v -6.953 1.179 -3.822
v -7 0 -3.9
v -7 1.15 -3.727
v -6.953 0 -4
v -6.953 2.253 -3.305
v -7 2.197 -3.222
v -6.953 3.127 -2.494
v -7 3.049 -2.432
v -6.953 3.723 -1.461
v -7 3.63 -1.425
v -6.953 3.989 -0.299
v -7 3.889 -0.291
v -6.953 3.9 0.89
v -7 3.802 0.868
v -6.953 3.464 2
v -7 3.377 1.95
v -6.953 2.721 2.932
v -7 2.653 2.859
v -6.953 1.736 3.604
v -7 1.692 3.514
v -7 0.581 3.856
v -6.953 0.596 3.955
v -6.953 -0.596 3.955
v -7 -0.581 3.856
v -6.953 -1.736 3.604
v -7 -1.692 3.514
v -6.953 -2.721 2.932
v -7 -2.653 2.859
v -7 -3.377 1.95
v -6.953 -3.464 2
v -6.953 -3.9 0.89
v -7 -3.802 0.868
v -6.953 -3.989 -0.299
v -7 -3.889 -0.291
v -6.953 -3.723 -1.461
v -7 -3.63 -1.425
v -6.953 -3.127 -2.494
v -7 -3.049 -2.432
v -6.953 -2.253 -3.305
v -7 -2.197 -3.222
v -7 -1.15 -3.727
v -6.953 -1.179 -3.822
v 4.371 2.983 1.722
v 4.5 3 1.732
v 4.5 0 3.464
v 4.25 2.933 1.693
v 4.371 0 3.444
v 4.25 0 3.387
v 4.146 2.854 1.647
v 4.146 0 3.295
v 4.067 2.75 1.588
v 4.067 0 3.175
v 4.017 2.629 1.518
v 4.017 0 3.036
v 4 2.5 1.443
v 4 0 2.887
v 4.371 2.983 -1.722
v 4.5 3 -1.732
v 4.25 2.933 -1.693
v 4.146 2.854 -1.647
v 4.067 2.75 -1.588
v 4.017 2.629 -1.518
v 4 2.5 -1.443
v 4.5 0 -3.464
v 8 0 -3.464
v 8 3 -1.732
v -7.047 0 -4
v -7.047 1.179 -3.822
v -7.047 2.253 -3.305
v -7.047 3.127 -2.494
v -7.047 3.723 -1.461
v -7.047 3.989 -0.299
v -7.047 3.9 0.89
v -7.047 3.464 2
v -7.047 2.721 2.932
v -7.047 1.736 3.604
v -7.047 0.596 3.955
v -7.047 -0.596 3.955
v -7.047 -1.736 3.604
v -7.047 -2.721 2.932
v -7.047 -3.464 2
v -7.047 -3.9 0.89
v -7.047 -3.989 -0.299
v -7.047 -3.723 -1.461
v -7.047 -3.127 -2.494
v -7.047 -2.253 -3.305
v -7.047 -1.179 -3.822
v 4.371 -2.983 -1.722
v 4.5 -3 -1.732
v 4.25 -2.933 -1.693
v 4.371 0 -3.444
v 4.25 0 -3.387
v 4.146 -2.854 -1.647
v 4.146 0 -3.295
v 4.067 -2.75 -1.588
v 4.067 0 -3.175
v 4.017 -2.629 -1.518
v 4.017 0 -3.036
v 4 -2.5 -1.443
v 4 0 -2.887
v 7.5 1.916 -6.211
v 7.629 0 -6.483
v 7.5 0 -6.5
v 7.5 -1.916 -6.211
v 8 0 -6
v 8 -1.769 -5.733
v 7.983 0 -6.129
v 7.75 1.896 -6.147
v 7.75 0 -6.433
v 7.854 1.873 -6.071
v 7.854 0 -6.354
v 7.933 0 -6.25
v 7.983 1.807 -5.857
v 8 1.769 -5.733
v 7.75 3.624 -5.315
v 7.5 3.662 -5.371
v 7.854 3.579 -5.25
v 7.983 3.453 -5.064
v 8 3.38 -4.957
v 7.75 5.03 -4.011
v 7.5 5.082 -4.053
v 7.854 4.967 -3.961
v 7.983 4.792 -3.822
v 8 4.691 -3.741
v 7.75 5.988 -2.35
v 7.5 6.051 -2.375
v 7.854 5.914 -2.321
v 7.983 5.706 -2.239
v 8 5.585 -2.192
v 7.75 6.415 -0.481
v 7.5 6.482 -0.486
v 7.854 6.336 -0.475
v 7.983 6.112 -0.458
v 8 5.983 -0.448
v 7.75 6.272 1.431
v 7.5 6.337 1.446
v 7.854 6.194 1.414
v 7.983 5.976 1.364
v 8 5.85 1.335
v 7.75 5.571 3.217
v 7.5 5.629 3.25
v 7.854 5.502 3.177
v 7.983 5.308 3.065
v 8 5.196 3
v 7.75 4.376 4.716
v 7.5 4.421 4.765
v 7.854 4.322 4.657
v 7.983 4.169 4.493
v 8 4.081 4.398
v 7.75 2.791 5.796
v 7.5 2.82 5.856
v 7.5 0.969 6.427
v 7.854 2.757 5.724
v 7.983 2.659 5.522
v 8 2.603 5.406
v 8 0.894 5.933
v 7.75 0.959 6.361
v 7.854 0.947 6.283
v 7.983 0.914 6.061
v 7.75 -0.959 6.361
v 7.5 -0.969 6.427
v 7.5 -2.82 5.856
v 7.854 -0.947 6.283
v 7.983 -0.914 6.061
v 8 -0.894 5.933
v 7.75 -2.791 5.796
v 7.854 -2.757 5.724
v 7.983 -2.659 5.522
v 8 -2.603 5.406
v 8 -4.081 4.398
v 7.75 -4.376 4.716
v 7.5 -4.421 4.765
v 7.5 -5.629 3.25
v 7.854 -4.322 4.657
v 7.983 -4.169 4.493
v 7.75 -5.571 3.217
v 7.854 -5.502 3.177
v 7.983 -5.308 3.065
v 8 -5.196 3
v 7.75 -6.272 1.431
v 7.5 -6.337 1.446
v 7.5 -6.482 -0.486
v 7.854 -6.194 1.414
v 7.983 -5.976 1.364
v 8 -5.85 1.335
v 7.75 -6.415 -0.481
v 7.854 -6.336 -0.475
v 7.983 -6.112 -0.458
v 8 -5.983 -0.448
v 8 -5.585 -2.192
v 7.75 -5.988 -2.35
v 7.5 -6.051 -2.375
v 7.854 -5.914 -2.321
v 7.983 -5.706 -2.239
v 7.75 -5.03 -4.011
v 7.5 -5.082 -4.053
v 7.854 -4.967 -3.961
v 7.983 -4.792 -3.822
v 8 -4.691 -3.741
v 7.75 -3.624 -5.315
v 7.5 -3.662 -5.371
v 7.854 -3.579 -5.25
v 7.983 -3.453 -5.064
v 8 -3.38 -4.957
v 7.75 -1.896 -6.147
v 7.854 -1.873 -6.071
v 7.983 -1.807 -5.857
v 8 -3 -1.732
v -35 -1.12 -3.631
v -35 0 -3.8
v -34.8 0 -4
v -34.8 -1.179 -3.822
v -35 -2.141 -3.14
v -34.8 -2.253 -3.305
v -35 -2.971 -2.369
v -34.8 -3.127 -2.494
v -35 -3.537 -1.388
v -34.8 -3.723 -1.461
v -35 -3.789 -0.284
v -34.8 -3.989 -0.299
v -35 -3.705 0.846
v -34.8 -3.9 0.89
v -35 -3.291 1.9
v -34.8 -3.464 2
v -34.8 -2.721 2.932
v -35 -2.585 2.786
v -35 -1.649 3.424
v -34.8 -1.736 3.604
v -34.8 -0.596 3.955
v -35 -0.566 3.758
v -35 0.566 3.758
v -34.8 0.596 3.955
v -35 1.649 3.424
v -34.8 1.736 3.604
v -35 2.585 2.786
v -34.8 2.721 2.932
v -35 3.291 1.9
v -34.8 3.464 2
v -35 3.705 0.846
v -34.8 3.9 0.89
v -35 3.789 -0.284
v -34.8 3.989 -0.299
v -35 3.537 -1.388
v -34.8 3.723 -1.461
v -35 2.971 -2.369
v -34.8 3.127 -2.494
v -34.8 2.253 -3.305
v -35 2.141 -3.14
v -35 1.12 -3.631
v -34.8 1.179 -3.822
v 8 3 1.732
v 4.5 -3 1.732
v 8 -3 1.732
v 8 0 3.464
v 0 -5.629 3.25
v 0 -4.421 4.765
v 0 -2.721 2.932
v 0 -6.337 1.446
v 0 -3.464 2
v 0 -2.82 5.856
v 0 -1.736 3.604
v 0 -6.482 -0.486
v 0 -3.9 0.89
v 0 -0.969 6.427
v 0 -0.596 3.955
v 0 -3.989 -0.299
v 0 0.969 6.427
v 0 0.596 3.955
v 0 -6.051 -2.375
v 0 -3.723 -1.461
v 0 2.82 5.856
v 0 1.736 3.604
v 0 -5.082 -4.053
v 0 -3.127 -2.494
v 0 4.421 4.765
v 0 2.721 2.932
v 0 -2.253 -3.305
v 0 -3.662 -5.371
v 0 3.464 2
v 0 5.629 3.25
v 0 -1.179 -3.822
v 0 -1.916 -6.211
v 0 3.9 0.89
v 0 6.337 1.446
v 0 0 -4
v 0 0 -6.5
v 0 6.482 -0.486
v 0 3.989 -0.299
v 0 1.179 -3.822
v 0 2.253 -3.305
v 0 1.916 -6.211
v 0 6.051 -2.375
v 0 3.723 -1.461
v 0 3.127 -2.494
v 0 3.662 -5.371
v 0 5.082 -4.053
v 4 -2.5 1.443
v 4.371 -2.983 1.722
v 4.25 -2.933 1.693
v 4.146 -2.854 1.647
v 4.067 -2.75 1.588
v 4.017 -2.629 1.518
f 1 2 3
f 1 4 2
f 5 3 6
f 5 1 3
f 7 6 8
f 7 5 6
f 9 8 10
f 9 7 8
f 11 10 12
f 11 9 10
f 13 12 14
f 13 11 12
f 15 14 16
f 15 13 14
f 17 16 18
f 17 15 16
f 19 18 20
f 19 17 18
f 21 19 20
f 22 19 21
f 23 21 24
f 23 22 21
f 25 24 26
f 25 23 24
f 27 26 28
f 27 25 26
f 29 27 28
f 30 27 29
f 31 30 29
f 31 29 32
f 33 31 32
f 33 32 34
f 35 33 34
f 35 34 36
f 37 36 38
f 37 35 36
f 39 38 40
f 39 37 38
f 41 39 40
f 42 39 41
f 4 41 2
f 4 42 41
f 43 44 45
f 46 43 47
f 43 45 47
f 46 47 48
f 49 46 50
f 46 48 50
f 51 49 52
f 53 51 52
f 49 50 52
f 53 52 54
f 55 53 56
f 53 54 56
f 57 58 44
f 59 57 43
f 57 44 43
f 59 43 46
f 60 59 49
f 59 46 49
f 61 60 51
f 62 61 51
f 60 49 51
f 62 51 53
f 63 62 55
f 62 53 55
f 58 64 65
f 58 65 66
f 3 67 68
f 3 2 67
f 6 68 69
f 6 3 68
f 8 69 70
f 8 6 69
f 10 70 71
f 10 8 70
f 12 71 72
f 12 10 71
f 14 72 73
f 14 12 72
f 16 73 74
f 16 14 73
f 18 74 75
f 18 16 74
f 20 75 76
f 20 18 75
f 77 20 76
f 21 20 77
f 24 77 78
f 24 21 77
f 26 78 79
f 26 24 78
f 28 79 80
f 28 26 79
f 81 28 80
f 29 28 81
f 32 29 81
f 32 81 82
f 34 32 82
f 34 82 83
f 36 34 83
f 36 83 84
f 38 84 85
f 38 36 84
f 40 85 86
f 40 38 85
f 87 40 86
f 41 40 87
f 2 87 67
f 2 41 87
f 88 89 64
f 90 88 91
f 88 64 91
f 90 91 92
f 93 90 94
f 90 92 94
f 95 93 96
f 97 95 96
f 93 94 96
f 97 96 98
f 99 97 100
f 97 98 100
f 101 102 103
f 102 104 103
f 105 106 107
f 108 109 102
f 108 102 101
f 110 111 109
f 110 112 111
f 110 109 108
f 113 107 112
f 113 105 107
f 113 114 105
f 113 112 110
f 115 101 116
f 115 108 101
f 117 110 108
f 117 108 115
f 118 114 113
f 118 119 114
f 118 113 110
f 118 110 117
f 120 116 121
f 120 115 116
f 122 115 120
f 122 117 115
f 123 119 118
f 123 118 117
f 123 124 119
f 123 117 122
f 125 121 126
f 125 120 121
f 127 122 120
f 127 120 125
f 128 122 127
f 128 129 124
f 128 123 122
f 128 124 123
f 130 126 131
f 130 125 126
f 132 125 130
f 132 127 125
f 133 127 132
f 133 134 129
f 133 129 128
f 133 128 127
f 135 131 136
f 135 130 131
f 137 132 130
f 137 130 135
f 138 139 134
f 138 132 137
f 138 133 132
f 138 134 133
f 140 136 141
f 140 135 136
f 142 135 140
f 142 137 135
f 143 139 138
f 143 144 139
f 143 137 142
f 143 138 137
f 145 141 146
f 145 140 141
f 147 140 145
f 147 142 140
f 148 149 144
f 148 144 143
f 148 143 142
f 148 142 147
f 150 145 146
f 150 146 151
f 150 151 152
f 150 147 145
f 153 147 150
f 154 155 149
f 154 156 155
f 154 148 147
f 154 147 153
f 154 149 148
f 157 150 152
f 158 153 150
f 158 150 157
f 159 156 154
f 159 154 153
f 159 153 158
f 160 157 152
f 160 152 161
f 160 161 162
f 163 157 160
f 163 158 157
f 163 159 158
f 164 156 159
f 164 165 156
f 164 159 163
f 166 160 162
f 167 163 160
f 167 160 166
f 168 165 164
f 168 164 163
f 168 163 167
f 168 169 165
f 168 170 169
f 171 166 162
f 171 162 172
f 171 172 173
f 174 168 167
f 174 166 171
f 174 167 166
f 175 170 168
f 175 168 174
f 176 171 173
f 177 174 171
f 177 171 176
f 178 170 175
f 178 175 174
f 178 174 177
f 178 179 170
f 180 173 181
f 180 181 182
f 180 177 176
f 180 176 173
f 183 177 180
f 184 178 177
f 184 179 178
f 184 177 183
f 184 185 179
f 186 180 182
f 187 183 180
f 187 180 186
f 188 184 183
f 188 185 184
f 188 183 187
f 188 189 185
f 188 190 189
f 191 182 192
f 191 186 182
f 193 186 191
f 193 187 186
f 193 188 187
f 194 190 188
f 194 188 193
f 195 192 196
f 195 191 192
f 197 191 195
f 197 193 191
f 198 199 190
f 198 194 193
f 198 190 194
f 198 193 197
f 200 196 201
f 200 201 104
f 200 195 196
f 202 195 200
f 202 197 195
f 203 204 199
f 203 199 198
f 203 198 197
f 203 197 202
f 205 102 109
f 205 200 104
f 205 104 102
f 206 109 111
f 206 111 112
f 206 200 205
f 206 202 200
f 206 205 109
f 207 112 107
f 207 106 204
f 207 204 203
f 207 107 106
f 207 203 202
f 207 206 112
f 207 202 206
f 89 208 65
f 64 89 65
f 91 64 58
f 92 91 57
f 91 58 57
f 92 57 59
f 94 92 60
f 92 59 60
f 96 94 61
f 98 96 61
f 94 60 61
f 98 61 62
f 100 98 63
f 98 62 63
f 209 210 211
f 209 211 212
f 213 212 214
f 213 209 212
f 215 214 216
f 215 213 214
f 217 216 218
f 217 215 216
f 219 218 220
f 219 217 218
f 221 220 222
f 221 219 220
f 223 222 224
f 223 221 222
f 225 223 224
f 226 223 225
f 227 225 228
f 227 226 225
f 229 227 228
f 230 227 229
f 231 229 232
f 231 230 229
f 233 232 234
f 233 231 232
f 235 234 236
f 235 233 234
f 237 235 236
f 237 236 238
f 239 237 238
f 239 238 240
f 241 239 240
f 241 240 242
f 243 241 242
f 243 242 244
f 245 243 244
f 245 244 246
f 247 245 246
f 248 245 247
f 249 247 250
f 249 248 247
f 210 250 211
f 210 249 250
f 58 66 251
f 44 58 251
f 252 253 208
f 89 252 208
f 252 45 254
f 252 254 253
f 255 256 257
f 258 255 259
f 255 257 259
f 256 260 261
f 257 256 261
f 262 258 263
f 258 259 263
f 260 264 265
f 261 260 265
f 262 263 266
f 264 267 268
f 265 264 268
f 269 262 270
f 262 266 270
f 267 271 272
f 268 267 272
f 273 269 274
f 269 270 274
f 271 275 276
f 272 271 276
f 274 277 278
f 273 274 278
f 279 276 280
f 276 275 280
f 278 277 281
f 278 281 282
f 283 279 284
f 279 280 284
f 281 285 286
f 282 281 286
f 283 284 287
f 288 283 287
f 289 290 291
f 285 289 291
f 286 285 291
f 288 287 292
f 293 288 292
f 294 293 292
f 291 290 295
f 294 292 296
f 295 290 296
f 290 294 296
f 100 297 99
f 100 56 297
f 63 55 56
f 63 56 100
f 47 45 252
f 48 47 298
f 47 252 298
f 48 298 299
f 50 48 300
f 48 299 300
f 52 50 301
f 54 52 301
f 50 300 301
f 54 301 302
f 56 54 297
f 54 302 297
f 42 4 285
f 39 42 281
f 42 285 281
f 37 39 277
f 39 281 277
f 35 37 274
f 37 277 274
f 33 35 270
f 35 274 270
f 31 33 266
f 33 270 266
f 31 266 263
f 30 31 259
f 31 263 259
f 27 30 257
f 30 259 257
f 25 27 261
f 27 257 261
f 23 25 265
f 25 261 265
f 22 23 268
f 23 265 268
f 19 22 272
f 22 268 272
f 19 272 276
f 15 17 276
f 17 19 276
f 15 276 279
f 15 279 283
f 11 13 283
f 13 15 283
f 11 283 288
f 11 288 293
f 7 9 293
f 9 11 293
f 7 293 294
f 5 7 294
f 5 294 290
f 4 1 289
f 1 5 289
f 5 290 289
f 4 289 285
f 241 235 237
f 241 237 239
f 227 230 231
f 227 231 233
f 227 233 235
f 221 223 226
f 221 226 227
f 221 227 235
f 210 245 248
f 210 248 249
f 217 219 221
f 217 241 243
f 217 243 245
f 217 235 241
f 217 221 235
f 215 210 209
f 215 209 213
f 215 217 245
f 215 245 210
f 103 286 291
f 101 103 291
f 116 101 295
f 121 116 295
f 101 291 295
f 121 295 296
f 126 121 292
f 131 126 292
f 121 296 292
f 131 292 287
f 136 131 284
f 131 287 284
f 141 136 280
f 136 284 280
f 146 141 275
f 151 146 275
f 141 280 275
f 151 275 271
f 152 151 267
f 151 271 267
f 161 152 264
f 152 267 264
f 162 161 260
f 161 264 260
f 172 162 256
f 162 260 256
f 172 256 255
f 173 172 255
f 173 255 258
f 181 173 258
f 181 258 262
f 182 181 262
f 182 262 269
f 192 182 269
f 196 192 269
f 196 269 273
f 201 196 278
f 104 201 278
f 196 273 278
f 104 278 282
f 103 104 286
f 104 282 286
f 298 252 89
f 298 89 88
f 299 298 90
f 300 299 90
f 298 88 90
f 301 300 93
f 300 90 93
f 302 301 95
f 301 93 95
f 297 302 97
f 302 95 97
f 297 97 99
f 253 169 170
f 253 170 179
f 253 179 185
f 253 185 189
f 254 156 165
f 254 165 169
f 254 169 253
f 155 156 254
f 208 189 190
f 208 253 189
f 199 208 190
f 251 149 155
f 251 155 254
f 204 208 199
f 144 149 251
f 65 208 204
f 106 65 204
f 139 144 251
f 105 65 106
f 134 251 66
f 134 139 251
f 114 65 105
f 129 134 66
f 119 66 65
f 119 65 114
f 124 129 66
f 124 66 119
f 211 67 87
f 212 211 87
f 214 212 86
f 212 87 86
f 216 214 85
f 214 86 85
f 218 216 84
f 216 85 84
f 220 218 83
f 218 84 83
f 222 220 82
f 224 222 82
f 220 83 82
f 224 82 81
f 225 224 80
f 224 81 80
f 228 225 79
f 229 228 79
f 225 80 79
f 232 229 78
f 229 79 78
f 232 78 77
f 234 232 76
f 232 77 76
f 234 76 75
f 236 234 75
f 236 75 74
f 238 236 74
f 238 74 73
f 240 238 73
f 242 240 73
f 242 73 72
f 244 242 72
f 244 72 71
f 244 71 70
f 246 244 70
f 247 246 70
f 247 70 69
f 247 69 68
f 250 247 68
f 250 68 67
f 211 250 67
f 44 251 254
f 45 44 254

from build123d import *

# Parameters (mm, degrees)
ESQUISSE1_R             = 6.5
BOSS_EXTRU_1_DEPTH      = 8
CONG_1_R                = 0.5
ENL_V_MAT_EXTRU_1_DEPTH = 4
CONG_2_R                = 0.5
ESQUISSE3_R             = 4
BOSS_EXTRU_2_DEPTH      = 35
CHANFREIN1_SIZE         = 0.2


with BuildPart() as part:
    # Esquisse1 → Boss.-Extru.1 (new body)
    with BuildSketch(Plane(origin=(0, 0, 0), x_dir=(0, 0, -1), z_dir=(1, 0, 0))):
        Circle(ESQUISSE1_R)
    extrude(amount=BOSS_EXTRU_1_DEPTH)

    # Congé1
    cong_1_edges = [part.edges().sort_by_distance(p)[0] for p in [
        (8, 0, 6.5),
    ]]
    fillet(cong_1_edges, radius=CONG_1_R)

    # Esquisse2 → Enlèv. mat.-Extru.1 (cut)
    with BuildSketch(Plane(origin=(8, 0, 0), x_dir=(0, 0, -1), z_dir=(1, 0, 0))):
        Polygon((1.732050808, -3), (3.464101615, 0), (1.732050808, 3), (-1.732050808, 3), (-3.464101615, 0), (-1.732050808, -3), align=None)
    extrude(amount=-ENL_V_MAT_EXTRU_1_DEPTH, mode=Mode.SUBTRACT)

    # Congé2
    cong_2_edges = [part.edges().sort_by_distance(p)[0] for p in [
        (4, -3, 0),
        (4, -1.5, 2.598076211),
        (4, 1.5, 2.598076211),
        (4, 3, 0),
        (4, 1.5, -2.598076211),
        (4, -1.5, -2.598076211),
    ]]
    fillet(cong_2_edges, radius=CONG_2_R)

    # Esquisse3 → Boss.-Extru.2 (add)
    with BuildSketch(Plane.ZY):
        with Locations(Location((0, 0, 0), (0, 0, 180))):  # turned: the seam where the file's is
            Circle(ESQUISSE3_R)
    extrude(amount=BOSS_EXTRU_2_DEPTH)

    # Esquisse4 → Enlèvement de matière-Révolution1 (revolve, cut)
    with BuildSketch(Plane(origin=(0, 0, 0), x_dir=(1, 0, 0), z_dir=(0, 1, 0))):
        Polygon((-7.046630766, 4), (-7, 3.9), (-6.953369234, 4), align=None)
    revolve(axis=Axis((-35, 0, 0), (1, 0, 0)), mode=Mode.SUBTRACT)

    # Chanfrein1
    chanfrein1_edges = [part.edges().sort_by_distance(p)[0] for p in [
        (-35, 0, 4),
    ]]
    chamfer(chanfrein1_edges, length=CHANFREIN1_SIZE)


solid = part.part
